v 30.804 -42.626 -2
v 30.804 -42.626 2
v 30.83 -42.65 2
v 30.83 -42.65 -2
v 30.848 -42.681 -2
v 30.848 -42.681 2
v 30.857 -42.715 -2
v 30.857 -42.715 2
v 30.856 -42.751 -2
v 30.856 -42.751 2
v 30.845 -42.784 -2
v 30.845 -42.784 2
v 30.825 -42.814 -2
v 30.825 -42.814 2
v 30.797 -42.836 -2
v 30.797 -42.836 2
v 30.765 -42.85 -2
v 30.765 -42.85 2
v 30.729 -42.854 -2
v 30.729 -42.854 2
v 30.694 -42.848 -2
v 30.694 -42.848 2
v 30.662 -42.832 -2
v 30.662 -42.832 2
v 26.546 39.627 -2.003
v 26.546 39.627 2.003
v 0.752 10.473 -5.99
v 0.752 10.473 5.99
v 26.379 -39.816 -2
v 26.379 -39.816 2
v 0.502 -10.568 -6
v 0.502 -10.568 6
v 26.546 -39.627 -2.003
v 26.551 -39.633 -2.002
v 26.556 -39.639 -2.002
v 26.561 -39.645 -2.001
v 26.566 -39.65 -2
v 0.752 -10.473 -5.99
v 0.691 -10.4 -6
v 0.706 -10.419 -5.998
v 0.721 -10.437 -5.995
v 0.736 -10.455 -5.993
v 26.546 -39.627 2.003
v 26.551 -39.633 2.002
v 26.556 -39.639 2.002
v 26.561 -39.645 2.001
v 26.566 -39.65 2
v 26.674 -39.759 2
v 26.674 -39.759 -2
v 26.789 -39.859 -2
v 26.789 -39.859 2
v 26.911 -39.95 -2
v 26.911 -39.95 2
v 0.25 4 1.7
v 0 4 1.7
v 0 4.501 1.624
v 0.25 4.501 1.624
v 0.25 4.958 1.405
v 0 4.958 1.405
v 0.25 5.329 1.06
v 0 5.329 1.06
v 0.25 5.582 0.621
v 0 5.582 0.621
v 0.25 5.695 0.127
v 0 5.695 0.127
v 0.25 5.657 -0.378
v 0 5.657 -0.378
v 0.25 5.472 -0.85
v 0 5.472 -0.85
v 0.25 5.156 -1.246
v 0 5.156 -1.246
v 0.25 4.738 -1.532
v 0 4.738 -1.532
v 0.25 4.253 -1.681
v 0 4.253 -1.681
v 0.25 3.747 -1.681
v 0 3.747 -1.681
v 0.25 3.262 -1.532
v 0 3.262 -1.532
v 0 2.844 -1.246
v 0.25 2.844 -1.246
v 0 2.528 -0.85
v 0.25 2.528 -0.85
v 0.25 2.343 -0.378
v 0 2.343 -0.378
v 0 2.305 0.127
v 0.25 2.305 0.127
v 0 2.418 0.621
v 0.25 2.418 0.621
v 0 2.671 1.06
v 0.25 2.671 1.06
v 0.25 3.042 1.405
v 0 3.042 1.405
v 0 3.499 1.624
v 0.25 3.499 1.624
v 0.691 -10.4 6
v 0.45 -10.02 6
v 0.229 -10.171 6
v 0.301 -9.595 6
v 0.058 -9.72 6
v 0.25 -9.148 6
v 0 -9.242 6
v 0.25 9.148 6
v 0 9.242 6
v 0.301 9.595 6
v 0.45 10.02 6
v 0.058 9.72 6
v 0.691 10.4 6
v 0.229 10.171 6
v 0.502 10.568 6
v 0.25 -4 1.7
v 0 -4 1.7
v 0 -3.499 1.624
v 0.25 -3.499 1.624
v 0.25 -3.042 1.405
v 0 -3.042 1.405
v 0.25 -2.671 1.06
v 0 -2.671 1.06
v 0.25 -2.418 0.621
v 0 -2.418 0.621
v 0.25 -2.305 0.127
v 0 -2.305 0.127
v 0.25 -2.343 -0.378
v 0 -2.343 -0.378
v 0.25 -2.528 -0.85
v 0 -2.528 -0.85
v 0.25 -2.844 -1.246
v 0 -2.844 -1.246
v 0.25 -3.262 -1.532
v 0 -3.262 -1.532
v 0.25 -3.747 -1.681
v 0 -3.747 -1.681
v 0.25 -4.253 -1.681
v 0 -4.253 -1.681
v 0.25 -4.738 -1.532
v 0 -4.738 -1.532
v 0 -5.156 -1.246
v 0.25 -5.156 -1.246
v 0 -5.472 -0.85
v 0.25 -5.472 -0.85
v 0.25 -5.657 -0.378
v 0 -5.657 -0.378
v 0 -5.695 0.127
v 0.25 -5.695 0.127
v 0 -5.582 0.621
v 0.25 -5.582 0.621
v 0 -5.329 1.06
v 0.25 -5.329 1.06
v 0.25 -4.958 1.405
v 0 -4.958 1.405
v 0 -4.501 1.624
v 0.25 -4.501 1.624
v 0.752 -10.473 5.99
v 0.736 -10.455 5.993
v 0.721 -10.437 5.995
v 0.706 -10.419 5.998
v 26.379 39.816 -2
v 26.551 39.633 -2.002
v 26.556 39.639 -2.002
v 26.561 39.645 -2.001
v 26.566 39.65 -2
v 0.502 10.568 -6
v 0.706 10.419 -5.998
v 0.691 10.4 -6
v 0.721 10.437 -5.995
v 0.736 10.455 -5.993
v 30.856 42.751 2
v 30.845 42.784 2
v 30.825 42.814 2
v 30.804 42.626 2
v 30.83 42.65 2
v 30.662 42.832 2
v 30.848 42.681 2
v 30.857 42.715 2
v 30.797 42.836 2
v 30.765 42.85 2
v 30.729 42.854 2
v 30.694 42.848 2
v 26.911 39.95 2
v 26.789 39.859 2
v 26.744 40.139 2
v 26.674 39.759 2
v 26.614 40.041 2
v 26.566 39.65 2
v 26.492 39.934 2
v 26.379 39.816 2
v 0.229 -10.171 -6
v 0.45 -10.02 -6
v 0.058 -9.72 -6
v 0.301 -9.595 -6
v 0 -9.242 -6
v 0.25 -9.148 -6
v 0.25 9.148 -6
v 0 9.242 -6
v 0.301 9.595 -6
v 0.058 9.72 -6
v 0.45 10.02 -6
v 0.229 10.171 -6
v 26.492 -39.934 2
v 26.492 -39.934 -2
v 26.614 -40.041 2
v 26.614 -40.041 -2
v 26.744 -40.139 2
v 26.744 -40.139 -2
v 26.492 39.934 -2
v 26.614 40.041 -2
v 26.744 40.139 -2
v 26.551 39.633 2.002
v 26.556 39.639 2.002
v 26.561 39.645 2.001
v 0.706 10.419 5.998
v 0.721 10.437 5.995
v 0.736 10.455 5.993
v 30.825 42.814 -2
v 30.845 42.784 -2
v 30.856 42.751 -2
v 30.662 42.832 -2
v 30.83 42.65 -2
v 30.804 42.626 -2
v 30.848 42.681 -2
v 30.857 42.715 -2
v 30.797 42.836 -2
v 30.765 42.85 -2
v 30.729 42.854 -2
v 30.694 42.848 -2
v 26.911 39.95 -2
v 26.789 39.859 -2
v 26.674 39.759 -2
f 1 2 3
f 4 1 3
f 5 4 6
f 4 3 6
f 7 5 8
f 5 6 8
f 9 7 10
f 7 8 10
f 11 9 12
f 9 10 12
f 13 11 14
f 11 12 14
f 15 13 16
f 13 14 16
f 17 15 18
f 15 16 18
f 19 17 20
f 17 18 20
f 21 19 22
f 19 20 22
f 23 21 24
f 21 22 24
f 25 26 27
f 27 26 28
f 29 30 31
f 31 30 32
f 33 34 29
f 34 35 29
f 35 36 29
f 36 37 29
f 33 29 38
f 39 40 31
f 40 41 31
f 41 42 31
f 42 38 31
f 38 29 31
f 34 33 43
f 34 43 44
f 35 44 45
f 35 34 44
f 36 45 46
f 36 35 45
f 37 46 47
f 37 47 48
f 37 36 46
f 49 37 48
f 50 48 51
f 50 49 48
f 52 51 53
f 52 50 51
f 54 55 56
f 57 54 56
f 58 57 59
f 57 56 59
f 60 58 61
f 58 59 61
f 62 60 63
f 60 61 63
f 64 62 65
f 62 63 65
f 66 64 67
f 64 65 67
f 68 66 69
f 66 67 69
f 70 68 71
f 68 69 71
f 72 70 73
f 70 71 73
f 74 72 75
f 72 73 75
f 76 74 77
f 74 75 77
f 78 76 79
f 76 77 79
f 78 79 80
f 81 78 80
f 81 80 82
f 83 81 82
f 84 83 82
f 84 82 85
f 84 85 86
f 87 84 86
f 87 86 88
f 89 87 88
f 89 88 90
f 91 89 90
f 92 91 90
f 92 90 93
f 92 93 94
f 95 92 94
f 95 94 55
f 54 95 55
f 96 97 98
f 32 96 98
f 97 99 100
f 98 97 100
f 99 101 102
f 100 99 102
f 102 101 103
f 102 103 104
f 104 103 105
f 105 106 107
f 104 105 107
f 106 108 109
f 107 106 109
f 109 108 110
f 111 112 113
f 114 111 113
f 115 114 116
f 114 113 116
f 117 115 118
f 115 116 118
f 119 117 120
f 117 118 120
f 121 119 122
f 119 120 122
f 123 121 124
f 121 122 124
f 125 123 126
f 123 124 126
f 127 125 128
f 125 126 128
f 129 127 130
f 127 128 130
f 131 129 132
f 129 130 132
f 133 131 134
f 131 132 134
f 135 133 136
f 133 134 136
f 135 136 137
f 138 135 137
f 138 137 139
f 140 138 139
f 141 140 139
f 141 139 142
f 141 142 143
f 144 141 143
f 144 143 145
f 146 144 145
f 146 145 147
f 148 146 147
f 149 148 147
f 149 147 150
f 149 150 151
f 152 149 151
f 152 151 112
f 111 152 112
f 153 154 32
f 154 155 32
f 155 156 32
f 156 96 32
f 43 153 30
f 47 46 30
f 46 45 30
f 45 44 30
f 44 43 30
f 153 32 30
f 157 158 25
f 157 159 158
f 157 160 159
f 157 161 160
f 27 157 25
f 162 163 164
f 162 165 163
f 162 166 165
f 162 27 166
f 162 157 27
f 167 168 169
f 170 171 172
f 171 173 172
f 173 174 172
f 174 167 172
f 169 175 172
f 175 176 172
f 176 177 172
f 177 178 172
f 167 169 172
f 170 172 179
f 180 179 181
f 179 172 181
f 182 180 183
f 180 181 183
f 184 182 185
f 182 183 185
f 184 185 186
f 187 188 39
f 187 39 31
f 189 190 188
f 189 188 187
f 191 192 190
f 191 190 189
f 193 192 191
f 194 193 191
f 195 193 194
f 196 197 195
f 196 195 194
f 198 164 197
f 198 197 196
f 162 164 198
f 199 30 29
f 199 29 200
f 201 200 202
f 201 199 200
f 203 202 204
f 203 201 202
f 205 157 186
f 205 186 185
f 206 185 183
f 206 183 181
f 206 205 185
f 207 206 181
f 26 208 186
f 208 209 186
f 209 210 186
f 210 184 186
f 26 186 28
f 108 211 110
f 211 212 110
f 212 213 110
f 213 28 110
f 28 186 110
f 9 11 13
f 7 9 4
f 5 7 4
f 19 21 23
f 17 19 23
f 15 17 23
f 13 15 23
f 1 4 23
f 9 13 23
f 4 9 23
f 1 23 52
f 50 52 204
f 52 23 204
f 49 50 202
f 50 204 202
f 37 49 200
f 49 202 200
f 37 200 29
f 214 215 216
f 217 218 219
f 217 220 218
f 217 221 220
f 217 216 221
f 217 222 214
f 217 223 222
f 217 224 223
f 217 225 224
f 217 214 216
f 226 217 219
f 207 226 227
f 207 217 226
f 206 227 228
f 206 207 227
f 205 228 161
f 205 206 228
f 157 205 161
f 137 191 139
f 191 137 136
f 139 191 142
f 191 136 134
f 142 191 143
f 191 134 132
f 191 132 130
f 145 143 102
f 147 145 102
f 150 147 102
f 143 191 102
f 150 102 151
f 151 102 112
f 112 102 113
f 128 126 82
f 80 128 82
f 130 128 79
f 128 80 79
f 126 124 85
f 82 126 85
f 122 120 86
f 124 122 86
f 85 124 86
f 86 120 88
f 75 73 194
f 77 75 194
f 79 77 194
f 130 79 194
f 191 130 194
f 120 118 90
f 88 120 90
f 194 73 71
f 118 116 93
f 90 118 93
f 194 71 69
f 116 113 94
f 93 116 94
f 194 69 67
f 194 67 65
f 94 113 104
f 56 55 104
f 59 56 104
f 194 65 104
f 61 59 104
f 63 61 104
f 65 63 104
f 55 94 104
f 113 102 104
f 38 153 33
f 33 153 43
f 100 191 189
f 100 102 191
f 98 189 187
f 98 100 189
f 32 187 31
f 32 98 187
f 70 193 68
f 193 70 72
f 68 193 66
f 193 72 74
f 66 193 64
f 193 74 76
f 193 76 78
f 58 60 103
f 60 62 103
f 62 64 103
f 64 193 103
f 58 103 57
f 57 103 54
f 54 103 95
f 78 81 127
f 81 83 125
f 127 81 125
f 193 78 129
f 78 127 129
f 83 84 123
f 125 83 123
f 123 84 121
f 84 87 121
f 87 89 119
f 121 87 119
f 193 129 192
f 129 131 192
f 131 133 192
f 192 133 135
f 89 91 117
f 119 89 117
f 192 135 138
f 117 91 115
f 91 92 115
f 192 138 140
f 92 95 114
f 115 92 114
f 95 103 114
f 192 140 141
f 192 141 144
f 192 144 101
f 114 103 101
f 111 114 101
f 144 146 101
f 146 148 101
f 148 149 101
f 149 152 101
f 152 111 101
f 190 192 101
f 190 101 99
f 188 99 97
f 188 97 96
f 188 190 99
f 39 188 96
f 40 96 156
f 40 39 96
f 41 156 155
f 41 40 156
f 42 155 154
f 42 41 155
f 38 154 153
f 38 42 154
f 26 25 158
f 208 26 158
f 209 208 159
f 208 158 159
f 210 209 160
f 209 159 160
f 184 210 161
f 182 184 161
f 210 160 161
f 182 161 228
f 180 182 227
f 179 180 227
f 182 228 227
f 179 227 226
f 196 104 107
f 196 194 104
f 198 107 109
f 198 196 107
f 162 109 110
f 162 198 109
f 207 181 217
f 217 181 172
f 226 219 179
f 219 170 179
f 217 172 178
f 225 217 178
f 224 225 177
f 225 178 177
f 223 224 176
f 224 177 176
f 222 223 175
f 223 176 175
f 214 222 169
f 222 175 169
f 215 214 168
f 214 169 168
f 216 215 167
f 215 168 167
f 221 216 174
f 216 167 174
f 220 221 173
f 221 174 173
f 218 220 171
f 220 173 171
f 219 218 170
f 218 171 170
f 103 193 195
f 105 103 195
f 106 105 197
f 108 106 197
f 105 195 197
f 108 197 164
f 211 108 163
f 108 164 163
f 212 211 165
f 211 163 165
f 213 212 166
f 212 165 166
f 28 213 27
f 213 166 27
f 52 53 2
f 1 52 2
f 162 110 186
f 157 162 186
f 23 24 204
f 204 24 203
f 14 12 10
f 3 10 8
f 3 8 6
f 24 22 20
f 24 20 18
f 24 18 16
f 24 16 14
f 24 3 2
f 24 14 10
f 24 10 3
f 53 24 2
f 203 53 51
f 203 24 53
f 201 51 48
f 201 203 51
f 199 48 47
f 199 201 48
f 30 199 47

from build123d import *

# Parameters (mm, degrees)
ESTRUSIONE_ESTRUSIONE1_DEPTH      = 6
ESTRUSIONE_ESTRUSIONE1_DEPTH_BACK = 6
FORO_PER_VITE_M3_1_D              = 3.4
RACCORDO1_R                       = 2
RACCORDO2_R                       = 2
RACCORDO3_R                       = 2
RACCORDO4_R                       = 2
RACCORDO5_R                       = 2
RACCORDO6_R                       = 2
RACCORDO7_R                       = 2
RACCORDO8_R                       = 2
TAGLIO_ESTRUSIONE2_DEPTH          = 60.591921093
TAGLIO_ESTRUSIONE3_DEPTH          = 60.591921093


with BuildPart() as part:
    # Schizzo1 → Estrusione-Estrusione1 (new, two sides: drawn at the far end of the back side and taken through both)
    with BuildSketch(Plane.XY.offset(-ESTRUSIONE_ESTRUSIONE1_DEPTH_BACK)):
        with BuildLine():
            Line((0, -10), (0, 10))
            Line((0, 10), (26.541757937, 40))
            Line((26.541757937, 40), (30.66238888, 42.832031185))
            ThreePointArc((30.66238888, 42.832031185), (30.836205433, 42.799816191), (30.803990439, 42.625999637))
            Line((30.803990439, 42.625999637), (26.708656989, 39.811354938))
            Line((26.708656989, 39.811354938), (0.25, 9.905283473))
            Line((0.25, 9.905283473), (0.25, -9.905283473))
            Line((0.25, -9.905283473), (26.708656989, -39.811354938))
            Line((26.708656989, -39.811354938), (30.803990439, -42.625999637))
            ThreePointArc((30.803990439, -42.625999637), (30.836205433, -42.799816191), (30.66238888, -42.832031185))
            Line((30.66238888, -42.832031185), (26.541757937, -40))
            Line((26.541757937, -40), (0, -10))
        make_face()
    extrude(amount=ESTRUSIONE_ESTRUSIONE1_DEPTH + ESTRUSIONE_ESTRUSIONE1_DEPTH_BACK)

    # Foro per Vite M3-1 (through all)
    with Locations(Plane(origin=(0.25, 0, 0), x_dir=(0, 0, -1), z_dir=(1, 0, 0))):
        with Locations((0, 4), (0, -4)):
            Hole(FORO_PER_VITE_M3_1_D / 2)

    # Raccordo1
    raccordo1_edges = [part.edges().sort_by_distance(p)[0] for p in [
        (0, 10, 0),
    ]]
    fillet(raccordo1_edges, radius=RACCORDO1_R)

    # Raccordo2
    raccordo2_edges = [part.edges().sort_by_distance(p)[0] for p in [
        (0, -10, 0),
    ]]
    fillet(raccordo2_edges, radius=RACCORDO2_R)

    # Raccordo3
    raccordo3_edges = [part.edges().sort_by_distance(p)[0] for p in [
        (26.541757937, -40, 0),
    ]]
    fillet(raccordo3_edges, radius=RACCORDO3_R)

    # Raccordo4
    raccordo4_edges = [part.edges().sort_by_distance(p)[0] for p in [
        (26.541757937, 40, 0),
    ]]
    fillet(raccordo4_edges, radius=RACCORDO4_R)

    # Raccordo5
    raccordo5_edges = [part.edges().sort_by_distance(p)[0] for p in [
        (0.25, -9.905283473, 0),
    ]]
    fillet(raccordo5_edges, radius=RACCORDO5_R)

    # Raccordo6
    raccordo6_edges = [part.edges().sort_by_distance(p)[0] for p in [
        (0.25, 9.905283473, 0),
    ]]
    fillet(raccordo6_edges, radius=RACCORDO6_R)

    # Raccordo7
    raccordo7_edges = [part.edges().sort_by_distance(p)[0] for p in [
        (26.708656989, 39.811354938, 0),
    ]]
    fillet(raccordo7_edges, radius=RACCORDO7_R)

    # Raccordo8
    raccordo8_edges = [part.edges().sort_by_distance(p)[0] for p in [
        (26.708656989, -39.811354938, 0),
    ]]
    fillet(raccordo8_edges, radius=RACCORDO8_R)

    # Schizzo4 → Taglio-Estrusione2 (cut, through all)
    with BuildSketch(Plane(origin=(-4.962730758, 4.390653283, 0), x_dir=(0, 0, 1), z_dir=(-0.7489557207890011, 0.6626200482157386, 0))):
        Polygon((2, 47.299760633), (6, 8.247289425), (6, 59.846735232), (2, 59.846735232), align=None)
        Polygon((-2, 47.299760633), (-6, 8.247289425), (-6, 59.846735232), (-2, 59.846735232), align=None)
    extrude(amount=-TAGLIO_ESTRUSIONE2_DEPTH, mode=Mode.SUBTRACT)

    # Schizzo6 → Taglio-Estrusione3 (cut, through all)
    with BuildSketch(Plane(origin=(-4.962730758, -4.390653283, 0), x_dir=(0, 0, 1), z_dir=(-0.7489557207890011, -0.6626200482157386, 0))):
        Polygon((6, -8.247289425), (2, -47.299760633), (2, -59.491955382), (6, -59.491955382), align=None)
        Polygon((-2, -47.299760633), (-6, -8.247289425), (-6, -59.491955382), (-2, -59.491955382), align=None)
    extrude(amount=-TAGLIO_ESTRUSIONE3_DEPTH, mode=Mode.SUBTRACT)


solid = part.part
